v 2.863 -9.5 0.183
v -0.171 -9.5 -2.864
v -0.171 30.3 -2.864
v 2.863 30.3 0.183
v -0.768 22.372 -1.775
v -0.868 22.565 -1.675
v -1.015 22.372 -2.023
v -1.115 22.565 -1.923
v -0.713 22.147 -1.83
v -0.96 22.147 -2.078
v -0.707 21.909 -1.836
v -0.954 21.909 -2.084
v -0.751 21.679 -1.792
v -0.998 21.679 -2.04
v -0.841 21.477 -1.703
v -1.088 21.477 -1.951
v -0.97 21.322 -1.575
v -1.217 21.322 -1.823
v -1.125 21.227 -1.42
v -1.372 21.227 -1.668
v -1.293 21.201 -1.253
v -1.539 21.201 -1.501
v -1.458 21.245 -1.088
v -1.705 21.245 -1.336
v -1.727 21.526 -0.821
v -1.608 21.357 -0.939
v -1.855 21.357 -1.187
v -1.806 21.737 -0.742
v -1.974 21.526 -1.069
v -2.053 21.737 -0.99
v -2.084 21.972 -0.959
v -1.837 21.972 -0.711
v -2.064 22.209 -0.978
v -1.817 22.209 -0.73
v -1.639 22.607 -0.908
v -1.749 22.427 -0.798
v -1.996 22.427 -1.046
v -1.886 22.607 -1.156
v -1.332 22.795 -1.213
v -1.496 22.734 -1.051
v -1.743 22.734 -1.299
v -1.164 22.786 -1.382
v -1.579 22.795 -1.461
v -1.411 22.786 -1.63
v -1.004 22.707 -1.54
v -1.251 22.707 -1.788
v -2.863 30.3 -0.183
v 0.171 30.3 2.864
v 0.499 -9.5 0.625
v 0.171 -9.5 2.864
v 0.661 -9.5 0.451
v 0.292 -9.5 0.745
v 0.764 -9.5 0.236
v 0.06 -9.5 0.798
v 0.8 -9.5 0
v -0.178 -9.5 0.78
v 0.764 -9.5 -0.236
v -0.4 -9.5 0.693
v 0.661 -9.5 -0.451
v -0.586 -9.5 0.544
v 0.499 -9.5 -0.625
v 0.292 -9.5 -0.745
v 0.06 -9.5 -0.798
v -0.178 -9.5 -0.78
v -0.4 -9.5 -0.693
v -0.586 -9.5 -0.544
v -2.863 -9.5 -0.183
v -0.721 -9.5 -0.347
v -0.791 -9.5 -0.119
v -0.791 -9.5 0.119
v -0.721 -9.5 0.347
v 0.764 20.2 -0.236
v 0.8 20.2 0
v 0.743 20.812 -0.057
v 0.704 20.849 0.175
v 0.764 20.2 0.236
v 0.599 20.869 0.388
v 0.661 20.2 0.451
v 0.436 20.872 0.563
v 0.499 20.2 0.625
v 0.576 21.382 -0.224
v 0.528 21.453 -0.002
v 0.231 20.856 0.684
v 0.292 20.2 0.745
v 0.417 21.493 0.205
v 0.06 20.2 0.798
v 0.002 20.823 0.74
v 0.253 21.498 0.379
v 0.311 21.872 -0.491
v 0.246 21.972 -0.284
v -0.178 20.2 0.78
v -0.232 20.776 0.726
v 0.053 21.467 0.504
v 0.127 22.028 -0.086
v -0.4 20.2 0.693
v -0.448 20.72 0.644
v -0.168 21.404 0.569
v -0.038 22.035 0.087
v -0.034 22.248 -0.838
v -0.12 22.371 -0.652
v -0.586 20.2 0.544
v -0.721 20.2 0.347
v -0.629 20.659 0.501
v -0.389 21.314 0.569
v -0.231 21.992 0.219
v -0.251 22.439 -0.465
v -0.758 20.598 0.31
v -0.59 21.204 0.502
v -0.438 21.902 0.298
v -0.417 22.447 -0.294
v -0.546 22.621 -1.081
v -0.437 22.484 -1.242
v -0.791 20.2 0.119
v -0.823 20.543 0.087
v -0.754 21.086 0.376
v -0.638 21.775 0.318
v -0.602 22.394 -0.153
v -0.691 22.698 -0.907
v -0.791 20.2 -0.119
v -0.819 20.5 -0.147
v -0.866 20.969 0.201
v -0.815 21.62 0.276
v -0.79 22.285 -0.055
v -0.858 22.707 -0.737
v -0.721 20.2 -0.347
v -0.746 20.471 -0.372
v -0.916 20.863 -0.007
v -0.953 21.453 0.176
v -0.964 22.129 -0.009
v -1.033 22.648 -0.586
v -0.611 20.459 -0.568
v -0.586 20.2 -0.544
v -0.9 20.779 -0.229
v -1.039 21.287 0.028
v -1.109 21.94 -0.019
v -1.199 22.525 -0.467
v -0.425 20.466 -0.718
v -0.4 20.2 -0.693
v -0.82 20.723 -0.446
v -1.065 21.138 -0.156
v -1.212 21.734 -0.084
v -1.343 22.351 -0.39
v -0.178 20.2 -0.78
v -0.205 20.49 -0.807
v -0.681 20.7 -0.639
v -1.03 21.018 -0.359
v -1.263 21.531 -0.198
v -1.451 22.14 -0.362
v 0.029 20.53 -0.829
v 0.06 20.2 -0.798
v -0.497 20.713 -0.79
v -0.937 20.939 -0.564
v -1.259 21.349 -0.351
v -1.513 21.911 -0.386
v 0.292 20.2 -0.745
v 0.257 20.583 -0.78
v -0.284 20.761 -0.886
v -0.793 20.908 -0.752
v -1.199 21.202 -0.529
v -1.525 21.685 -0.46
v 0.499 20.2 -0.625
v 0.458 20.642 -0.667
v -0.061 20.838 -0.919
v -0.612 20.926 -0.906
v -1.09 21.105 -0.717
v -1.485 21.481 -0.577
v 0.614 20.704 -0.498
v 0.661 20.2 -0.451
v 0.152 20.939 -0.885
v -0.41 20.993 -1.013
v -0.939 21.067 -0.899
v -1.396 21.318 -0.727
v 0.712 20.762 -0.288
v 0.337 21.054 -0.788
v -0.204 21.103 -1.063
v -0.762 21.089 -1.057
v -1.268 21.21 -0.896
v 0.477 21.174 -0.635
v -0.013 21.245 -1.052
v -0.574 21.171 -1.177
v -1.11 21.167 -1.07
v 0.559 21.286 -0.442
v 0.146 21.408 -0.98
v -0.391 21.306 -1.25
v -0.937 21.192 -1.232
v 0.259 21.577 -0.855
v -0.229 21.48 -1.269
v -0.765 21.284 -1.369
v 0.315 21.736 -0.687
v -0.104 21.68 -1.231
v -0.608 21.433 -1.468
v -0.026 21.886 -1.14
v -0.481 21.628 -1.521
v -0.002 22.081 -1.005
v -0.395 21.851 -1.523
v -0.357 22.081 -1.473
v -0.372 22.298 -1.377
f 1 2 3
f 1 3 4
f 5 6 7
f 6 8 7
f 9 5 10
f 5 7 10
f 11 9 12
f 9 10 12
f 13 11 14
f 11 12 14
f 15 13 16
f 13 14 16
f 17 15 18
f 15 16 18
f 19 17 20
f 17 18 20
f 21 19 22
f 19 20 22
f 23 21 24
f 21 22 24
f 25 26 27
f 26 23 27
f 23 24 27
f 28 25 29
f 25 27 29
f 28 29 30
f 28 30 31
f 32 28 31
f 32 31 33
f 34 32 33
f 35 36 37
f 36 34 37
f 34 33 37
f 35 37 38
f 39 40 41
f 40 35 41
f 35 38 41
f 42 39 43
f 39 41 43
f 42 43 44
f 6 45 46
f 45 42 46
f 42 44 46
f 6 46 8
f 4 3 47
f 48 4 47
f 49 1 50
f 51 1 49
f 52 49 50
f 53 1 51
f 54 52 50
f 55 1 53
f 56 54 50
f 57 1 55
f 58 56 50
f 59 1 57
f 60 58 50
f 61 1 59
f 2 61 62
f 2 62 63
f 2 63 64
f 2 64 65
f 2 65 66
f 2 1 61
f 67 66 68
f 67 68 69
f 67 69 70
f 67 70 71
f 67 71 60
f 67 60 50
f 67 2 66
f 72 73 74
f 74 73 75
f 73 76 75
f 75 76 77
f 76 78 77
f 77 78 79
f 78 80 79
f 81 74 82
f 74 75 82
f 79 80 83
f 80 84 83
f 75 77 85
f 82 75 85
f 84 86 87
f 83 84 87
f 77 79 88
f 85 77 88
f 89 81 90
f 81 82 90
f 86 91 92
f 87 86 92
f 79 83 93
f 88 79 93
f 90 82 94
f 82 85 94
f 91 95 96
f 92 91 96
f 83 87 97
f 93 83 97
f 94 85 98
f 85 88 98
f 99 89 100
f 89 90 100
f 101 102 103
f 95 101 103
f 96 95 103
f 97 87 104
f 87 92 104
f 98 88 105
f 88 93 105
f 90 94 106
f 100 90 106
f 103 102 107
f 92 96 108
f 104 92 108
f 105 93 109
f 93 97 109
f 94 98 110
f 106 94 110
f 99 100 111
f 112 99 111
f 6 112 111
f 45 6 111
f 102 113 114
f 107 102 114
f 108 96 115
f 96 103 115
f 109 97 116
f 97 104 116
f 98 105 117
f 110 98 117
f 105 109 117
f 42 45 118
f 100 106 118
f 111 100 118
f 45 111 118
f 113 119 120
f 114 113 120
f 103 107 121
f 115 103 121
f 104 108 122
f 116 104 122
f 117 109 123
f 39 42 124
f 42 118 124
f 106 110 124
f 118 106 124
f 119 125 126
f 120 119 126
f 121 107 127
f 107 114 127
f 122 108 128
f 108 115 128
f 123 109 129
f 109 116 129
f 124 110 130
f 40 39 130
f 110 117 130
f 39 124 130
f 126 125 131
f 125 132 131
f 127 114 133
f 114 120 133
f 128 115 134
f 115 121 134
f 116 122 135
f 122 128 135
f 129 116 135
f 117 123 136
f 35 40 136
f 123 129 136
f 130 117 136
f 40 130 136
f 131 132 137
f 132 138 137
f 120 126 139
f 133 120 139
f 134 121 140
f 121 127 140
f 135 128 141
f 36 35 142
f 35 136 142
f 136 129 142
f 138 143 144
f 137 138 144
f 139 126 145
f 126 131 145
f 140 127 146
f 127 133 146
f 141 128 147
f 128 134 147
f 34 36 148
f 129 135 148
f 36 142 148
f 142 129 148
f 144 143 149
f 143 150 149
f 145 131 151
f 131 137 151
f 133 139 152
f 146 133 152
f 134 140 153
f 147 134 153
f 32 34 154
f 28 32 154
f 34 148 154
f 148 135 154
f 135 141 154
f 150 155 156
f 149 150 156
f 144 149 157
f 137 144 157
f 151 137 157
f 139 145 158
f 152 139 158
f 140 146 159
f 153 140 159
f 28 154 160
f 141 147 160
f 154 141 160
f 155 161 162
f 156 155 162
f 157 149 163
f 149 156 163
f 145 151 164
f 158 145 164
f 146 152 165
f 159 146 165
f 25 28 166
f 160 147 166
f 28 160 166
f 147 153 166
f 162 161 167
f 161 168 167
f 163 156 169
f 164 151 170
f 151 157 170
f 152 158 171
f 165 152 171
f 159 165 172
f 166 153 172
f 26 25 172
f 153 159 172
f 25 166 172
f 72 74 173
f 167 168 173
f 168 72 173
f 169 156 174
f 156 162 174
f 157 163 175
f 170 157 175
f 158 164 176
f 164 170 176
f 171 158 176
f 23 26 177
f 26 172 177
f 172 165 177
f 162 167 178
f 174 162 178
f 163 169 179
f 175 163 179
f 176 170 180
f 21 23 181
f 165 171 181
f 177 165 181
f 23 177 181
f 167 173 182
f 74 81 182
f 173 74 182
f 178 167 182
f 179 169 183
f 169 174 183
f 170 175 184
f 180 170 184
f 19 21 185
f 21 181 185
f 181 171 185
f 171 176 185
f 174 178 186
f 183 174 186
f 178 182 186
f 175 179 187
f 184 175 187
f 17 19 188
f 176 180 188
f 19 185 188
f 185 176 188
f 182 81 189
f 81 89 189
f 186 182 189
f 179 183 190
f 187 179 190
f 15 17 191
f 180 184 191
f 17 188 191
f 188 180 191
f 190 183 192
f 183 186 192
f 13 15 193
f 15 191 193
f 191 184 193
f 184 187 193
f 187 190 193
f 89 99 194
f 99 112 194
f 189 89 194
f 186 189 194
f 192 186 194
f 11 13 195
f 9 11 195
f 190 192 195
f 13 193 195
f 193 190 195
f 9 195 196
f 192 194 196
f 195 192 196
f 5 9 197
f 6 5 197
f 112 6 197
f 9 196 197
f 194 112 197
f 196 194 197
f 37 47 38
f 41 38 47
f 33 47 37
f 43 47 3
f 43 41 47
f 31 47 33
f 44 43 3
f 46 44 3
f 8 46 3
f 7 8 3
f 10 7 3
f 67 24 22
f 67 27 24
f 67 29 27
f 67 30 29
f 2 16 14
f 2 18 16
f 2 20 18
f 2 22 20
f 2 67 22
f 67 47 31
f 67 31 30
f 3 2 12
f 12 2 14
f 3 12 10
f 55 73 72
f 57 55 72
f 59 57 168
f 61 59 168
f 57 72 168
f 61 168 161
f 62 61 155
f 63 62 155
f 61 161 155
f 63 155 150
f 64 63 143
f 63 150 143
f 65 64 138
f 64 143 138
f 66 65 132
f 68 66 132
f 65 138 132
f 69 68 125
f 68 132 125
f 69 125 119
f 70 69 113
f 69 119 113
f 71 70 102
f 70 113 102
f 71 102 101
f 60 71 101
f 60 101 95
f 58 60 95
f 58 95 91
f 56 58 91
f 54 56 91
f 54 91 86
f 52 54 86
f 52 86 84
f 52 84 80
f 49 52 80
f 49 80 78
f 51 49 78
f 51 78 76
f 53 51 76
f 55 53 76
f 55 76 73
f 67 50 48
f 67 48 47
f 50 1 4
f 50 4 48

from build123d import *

# Parameters (mm, degrees)
BOSS_EXTRUDE1_DEPTH      = 30.3
BOSS_EXTRUDE1_DEPTH_BACK = 9.5
SKETCH4_R                = 0.8


with BuildPart() as part:
    # Sketch1 → Boss-Extrude1 (new, two sides: drawn at the far end of the back side and taken through both)
    with BuildSketch(Plane(origin=(0, 0, 0), x_dir=(1, 0, 0), z_dir=(0, 1, 0)).offset(-BOSS_EXTRUDE1_DEPTH_BACK)):
        Polygon((0.170807804, -2.864144671), (-2.863407818, 0.182744818), (-0.170807804, 2.864144671), (2.863407818, -0.182744818), align=None)
    extrude(amount=BOSS_EXTRUDE1_DEPTH + BOSS_EXTRUDE1_DEPTH_BACK)

    # Cut-Sweep1: sweep along a path in Sketch2
    with BuildLine(Plane(origin=(0, 0, 0), x_dir=(0.7056315400669045, 0, 0.7085789509030087), z_dir=(-0.7085789509030087, 0, 0.7056315400669045))) as cut_sweep1_path:
        Line((0, -9.5), (0, 20.2))
        ThreePointArc((0, 20.2), (-0.527207794, 21.472792206), (-1.8, 22))
        Line((-1.8, 22), (-2.25, 22))
    # Sketch4 → Cut-Sweep1 (sweep, cut)
    with BuildSketch(Plane.XZ.offset(9.5)):
        Circle(SKETCH4_R)
    sweep(path=cut_sweep1_path.line, mode=Mode.SUBTRACT)


solid = part.part
